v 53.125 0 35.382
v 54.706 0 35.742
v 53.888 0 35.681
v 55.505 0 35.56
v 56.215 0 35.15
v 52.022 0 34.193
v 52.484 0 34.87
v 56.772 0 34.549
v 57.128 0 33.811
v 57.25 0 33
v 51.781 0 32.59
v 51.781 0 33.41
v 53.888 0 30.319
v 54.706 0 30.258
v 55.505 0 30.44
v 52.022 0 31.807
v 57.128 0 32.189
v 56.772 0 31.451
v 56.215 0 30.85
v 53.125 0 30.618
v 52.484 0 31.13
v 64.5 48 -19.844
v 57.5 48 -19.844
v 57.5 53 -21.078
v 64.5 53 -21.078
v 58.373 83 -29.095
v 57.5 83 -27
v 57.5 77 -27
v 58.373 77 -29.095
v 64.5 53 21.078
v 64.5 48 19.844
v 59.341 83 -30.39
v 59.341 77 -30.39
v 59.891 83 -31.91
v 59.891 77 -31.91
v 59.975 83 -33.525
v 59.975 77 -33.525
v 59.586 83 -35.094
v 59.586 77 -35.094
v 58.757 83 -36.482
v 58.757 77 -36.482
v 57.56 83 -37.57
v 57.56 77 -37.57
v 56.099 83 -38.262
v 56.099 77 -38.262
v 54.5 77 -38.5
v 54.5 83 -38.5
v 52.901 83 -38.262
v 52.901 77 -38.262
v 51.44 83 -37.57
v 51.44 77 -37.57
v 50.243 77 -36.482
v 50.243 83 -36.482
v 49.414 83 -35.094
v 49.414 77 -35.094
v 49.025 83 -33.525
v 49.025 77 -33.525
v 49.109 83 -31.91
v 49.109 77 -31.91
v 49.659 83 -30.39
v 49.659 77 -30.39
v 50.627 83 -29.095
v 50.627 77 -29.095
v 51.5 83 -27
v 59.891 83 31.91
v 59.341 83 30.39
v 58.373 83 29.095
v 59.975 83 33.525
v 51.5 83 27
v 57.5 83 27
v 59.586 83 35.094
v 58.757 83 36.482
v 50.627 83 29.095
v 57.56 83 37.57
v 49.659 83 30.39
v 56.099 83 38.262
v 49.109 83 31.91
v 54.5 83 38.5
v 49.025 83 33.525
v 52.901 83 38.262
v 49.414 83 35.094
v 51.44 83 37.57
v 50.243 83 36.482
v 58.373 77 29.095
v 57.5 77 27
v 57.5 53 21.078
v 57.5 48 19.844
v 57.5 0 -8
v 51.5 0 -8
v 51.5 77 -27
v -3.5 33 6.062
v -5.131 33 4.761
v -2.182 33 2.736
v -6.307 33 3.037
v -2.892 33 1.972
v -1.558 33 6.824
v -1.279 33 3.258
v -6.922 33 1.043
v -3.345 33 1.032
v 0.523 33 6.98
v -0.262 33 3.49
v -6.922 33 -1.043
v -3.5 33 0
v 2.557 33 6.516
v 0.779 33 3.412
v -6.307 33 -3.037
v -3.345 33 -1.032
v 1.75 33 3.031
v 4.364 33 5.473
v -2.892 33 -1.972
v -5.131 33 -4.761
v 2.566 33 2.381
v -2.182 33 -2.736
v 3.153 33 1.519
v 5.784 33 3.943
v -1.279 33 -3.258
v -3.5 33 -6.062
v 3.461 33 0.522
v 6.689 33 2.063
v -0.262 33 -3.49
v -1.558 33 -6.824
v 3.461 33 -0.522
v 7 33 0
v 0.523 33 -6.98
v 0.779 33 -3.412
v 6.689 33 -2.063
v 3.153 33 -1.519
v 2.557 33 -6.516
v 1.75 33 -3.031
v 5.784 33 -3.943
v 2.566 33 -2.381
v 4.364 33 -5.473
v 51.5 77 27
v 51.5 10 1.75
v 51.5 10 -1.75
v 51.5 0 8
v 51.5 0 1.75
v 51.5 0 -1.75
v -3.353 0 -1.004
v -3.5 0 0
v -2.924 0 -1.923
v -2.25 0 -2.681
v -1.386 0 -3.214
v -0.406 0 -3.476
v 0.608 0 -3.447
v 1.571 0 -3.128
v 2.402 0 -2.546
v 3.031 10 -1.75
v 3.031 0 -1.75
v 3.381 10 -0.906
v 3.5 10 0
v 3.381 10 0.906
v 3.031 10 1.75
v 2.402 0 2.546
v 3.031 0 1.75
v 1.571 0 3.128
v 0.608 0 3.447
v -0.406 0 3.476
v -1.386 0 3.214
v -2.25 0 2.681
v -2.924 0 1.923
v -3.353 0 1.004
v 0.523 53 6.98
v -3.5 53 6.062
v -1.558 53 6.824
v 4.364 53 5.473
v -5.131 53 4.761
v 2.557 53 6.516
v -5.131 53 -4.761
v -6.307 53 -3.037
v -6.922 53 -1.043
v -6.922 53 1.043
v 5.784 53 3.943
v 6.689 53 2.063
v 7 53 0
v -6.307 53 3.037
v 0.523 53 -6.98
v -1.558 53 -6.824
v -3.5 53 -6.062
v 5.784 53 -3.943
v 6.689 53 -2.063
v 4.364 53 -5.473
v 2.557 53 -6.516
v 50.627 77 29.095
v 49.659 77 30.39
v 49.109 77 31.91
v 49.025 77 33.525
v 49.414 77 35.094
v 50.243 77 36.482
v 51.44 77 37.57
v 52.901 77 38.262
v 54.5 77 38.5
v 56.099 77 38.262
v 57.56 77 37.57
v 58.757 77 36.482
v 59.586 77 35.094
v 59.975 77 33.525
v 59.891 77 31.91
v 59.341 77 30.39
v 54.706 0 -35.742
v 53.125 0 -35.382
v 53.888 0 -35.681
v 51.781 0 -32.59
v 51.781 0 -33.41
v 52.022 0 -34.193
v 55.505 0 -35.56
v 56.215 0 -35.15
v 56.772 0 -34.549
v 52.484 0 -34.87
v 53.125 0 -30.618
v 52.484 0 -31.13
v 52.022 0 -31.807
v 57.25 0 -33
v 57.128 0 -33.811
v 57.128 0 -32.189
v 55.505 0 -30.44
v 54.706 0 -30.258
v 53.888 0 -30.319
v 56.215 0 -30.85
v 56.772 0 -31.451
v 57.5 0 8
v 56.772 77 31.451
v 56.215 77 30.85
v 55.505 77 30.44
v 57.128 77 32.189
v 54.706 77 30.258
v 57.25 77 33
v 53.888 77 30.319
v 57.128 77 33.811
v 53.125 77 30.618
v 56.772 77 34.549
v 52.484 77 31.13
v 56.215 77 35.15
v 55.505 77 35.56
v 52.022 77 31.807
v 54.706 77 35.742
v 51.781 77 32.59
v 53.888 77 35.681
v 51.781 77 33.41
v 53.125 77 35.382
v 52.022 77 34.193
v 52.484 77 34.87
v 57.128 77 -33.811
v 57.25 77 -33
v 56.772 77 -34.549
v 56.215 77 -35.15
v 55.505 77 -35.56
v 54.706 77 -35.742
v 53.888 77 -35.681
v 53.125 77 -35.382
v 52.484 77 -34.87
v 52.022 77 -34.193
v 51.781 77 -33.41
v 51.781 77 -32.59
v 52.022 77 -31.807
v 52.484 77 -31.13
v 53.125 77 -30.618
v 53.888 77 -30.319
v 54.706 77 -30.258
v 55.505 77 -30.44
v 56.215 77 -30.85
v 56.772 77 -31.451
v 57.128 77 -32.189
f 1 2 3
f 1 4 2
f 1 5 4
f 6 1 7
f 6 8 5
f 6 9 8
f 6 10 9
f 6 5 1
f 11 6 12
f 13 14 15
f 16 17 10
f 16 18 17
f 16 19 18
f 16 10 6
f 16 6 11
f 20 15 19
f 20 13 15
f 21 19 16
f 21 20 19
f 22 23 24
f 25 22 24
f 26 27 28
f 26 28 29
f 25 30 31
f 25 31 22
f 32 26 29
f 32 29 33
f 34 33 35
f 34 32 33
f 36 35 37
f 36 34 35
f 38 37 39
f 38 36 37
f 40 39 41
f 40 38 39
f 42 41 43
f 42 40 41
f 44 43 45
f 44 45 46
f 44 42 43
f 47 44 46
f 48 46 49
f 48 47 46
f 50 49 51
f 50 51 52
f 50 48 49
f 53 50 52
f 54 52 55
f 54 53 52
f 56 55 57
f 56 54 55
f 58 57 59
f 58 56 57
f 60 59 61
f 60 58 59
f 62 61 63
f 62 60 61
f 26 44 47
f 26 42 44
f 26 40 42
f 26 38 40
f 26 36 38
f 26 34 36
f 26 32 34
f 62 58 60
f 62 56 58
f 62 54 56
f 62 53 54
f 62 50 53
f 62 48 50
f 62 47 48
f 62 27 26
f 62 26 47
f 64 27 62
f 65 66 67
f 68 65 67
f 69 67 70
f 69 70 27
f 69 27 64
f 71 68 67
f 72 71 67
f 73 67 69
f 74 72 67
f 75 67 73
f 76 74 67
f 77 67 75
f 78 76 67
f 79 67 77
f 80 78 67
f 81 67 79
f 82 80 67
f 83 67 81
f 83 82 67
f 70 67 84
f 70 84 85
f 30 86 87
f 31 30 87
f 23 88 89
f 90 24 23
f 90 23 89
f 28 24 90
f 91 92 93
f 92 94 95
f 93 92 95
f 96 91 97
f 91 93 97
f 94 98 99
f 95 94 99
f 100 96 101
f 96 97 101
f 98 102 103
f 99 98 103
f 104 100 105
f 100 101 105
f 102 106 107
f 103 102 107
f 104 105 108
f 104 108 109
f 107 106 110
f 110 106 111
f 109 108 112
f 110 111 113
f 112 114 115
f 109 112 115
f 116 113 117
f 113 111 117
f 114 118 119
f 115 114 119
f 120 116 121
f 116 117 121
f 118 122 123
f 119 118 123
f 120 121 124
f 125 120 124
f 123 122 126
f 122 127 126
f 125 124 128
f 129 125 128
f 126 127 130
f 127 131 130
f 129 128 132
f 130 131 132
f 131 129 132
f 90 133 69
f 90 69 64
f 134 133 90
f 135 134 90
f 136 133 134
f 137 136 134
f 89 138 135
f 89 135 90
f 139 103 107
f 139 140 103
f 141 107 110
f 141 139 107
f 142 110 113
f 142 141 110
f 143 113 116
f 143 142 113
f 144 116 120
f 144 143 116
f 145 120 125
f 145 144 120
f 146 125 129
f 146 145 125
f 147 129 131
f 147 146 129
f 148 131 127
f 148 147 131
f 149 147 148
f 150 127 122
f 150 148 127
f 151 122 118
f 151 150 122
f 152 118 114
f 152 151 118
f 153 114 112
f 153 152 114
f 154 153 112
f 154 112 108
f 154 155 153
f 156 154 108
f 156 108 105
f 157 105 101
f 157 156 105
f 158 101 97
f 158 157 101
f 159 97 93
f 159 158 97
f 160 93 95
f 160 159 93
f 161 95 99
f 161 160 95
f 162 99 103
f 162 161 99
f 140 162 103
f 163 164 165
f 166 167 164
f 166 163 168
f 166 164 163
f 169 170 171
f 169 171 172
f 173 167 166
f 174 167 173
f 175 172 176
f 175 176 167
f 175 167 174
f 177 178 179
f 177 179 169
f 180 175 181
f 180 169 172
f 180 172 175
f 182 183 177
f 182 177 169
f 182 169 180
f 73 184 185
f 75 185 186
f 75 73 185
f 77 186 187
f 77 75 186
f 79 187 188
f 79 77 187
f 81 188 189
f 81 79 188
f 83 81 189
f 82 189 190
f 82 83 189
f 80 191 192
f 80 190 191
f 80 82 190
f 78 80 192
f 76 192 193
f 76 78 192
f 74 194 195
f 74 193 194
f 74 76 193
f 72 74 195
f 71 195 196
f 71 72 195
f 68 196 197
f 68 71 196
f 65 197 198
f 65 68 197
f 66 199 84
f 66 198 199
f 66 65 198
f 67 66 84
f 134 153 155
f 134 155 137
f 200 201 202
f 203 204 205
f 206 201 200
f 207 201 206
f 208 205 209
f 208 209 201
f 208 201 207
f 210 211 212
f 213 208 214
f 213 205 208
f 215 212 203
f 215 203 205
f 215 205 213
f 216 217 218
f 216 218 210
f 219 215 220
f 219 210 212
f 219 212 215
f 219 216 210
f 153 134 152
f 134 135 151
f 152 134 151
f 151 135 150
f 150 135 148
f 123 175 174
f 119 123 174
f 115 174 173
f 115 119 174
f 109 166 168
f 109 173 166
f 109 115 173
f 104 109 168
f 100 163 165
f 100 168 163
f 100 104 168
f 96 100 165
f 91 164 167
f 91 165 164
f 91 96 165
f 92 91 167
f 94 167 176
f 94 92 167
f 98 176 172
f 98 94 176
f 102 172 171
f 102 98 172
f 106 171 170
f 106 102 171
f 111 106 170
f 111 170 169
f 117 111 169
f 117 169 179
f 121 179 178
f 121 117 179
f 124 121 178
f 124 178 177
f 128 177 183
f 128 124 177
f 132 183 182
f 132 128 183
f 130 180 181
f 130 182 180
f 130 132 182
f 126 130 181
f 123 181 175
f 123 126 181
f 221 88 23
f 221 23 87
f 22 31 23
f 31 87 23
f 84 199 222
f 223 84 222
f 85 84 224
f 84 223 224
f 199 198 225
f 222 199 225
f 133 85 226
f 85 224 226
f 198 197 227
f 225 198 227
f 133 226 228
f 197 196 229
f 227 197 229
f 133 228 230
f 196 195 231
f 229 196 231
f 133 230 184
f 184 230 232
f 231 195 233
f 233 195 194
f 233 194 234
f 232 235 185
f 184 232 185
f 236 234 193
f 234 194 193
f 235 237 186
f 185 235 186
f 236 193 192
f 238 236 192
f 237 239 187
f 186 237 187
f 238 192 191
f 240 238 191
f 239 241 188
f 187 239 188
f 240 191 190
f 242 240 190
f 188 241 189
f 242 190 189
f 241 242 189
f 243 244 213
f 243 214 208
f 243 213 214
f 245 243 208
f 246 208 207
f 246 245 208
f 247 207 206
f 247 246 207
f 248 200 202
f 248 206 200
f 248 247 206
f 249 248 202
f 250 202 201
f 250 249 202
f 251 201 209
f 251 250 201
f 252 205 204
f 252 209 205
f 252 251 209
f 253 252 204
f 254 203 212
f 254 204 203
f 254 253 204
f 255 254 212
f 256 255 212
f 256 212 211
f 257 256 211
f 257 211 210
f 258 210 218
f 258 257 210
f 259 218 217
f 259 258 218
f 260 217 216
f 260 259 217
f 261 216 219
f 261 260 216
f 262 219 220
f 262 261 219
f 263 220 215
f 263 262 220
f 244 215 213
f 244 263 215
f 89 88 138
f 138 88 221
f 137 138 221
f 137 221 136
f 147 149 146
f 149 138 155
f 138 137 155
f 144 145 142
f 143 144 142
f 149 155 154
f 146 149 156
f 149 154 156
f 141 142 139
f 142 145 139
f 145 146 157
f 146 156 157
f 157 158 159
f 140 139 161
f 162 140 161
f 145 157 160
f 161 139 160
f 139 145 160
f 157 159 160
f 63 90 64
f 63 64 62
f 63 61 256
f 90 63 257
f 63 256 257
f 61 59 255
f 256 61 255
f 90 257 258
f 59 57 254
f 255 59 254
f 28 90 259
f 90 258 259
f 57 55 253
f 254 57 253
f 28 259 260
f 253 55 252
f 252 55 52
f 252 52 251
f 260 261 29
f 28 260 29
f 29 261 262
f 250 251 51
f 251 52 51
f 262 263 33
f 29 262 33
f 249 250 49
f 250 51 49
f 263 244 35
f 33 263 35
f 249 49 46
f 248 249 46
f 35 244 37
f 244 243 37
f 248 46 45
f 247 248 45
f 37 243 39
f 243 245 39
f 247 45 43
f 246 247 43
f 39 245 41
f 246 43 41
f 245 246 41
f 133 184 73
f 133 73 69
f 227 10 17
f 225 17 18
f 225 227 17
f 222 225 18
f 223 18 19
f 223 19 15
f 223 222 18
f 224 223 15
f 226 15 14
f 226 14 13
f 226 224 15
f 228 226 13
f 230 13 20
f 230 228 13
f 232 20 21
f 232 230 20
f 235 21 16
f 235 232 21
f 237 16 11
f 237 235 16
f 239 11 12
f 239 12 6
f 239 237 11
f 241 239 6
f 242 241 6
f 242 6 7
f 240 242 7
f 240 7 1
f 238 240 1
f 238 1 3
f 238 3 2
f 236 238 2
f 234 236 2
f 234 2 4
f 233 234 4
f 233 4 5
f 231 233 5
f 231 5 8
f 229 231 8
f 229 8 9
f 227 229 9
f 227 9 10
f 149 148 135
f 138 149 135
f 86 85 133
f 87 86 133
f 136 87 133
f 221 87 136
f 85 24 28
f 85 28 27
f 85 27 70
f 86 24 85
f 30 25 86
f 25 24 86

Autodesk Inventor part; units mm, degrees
ref_plane "YZ Plane" through (0, 0, 0) normal (1, 0, 0) x (0, 1, 0)
ref_plane "XZ Plane" through (0, 0, 0) normal (0, 1, 0) x (-1, 0, 0)
ref_plane "XY Plane" through (0, 0, 0) normal (0, 0, 1) x (1, 0, 0)
sketch "Sketch1" plane through (0, 0, 0) normal (0, 1, 0) x (-1, 0, 0)
  circle A0 centre (0, 0) radius 3.5
  dimension "d0" = 7
extrude "Extrusion1" add sketch "Sketch1" along normal blind 33
sketch "Sketch2" plane through (0, 33, 0) normal (0, 1, 0) x (1, 0, 0)
  circle A0 centre (0, 0) radius 7
  dimension "d3" = 14
extrude "Extrusion2" add sketch "Sketch2" along normal blind 20
sketch "Sketch3" plane through (0, 0, 0) normal (0, 0, 1) x (1, 0, 0)
  line L0 (0, 0) -> (57.5, 0)
  line L1 (57.5, 0) -> (57.5, 10)
  line L2 (57.5, 10) -> (0, 10)
  line L3 (0, 10) -> (0, 0)
  dimension "d6" = 57.5
  dimension "d7" = 10
extrude "Extrusion3" add sketch "Sketch3" along normal mid plane 3.5
sketch "Sketch4" plane through (57.5, 0, 1.75) normal (1, 0, 0) x (0, 0, -1)
  line L0 (1.75, 0) -> (9.75, 0)
  line L1 (9.75, 0) -> (28.75, 77)
  line L2 (1.75, 0) -> (1.75, 77)
  line L3 (1.75, 77) -> (28.75, 77)
  dimension "d10" = 8
  dimension "d11" = 27
  dimension "d12" = 77
extrude "Extrusion4" add sketch "Sketch4" against normal blind 6
sketch "Sketch5" plane through (57.5, 77, 0) normal (0, 1, 0) x (1, 0, 0)
  line L0 (0, 27) -> (0, 0) projected
  line L1 (0, 27) -> (-6, 27) projected
  line L2 (-6, 0) -> (-6, 27) projected
  line L3 (0, 0) -> (-6, 0) projected
  point P0 (-57.5, 0)
extrude "Extrusion5" add sketch "Sketch5" along normal blind 6
sketch "Sketch6" plane through (57.5, 83, 0) normal (0, 1, 0) x (1, 0, 0)
  circle A0 centre (-3, 33) radius 5.5
  line L0 (-6, 0) -> (0, 0) projected
  line L1 (-6, 27) -> (-6, 0) projected
  line L2 (-6, 27) -> (-8.5, 33)
  line L3 (0, 8) -> (0, 27) projected
  line L4 (0, 27) -> (2.5, 33)
  line L5 (0, 27) -> (-6, 27) projected
  line L6 (-6, 27) -> (0, 27)
  line L7 (-8.5, 33) -> (2.5, 33)
  point P0 (-57.5, 0)
  point P1 (0.8728, 29.0947)
  point P2 (-6.8728, 29.0947)
  dimension "d17" = 11
  dimension "d18" = 33
  dimension "d19" = 3
extrude "Extrusion6" add sketch "Sketch6" against normal blind 6
sketch "Sketch7" plane through (57.5, 77, 0) normal (0, -1, 0) x (1, 0, 0)
  arc A0 (-6.8728, -29.0947) -> (0.8728, -29.0947) centre (-3, -33) ccw projected
  circle A1 centre (-3, -33) radius 2.75
  point P0 (-57.5, 0)
  dimension "d22" = 5.5
extrude "Extrusion7" add sketch "Sketch7" along normal blind 77
mirror "Mirror1" about plane through (57.5, 0, 0) normal (0, 0, 1) of "Extrusion4", "Extrusion6", "Extrusion5", "Extrusion7"
sketch "Sketch8" plane through (57.5, 77, -27) normal (1, 0, 0) x (0, 0, -1)
  line L0 (-27, -77) -> (-27, -3.2697)
  line L1 (-46.8442, -29) -> (-7.1558, -29)
  line L2 (-7.1558, -29) -> (-5.9221, -24)
  line L3 (-5.9221, -24) -> (-48.0779, -24)
  line L4 (-48.0779, -24) -> (-46.8442, -29)
  line L5 (-46.8442, -29) -> (-5.9221, -24) construction
  line L6 (-7.1558, -29) -> (-48.0779, -24) construction
  line L7 (0, 6) -> (-54, 6) projected
  line L8 (-19, -77) -> (0, 0) projected
  line L9 (-35, -77) -> (-54, 0) projected
  point P0 (-27, -26.5754)
  dimension "d27" = 30
  dimension "d30" = 5
extrude "Extrusion8" add sketch "Sketch8" along normal blind 7
properties part number "Cube Cage" material "ABS Plastic"
